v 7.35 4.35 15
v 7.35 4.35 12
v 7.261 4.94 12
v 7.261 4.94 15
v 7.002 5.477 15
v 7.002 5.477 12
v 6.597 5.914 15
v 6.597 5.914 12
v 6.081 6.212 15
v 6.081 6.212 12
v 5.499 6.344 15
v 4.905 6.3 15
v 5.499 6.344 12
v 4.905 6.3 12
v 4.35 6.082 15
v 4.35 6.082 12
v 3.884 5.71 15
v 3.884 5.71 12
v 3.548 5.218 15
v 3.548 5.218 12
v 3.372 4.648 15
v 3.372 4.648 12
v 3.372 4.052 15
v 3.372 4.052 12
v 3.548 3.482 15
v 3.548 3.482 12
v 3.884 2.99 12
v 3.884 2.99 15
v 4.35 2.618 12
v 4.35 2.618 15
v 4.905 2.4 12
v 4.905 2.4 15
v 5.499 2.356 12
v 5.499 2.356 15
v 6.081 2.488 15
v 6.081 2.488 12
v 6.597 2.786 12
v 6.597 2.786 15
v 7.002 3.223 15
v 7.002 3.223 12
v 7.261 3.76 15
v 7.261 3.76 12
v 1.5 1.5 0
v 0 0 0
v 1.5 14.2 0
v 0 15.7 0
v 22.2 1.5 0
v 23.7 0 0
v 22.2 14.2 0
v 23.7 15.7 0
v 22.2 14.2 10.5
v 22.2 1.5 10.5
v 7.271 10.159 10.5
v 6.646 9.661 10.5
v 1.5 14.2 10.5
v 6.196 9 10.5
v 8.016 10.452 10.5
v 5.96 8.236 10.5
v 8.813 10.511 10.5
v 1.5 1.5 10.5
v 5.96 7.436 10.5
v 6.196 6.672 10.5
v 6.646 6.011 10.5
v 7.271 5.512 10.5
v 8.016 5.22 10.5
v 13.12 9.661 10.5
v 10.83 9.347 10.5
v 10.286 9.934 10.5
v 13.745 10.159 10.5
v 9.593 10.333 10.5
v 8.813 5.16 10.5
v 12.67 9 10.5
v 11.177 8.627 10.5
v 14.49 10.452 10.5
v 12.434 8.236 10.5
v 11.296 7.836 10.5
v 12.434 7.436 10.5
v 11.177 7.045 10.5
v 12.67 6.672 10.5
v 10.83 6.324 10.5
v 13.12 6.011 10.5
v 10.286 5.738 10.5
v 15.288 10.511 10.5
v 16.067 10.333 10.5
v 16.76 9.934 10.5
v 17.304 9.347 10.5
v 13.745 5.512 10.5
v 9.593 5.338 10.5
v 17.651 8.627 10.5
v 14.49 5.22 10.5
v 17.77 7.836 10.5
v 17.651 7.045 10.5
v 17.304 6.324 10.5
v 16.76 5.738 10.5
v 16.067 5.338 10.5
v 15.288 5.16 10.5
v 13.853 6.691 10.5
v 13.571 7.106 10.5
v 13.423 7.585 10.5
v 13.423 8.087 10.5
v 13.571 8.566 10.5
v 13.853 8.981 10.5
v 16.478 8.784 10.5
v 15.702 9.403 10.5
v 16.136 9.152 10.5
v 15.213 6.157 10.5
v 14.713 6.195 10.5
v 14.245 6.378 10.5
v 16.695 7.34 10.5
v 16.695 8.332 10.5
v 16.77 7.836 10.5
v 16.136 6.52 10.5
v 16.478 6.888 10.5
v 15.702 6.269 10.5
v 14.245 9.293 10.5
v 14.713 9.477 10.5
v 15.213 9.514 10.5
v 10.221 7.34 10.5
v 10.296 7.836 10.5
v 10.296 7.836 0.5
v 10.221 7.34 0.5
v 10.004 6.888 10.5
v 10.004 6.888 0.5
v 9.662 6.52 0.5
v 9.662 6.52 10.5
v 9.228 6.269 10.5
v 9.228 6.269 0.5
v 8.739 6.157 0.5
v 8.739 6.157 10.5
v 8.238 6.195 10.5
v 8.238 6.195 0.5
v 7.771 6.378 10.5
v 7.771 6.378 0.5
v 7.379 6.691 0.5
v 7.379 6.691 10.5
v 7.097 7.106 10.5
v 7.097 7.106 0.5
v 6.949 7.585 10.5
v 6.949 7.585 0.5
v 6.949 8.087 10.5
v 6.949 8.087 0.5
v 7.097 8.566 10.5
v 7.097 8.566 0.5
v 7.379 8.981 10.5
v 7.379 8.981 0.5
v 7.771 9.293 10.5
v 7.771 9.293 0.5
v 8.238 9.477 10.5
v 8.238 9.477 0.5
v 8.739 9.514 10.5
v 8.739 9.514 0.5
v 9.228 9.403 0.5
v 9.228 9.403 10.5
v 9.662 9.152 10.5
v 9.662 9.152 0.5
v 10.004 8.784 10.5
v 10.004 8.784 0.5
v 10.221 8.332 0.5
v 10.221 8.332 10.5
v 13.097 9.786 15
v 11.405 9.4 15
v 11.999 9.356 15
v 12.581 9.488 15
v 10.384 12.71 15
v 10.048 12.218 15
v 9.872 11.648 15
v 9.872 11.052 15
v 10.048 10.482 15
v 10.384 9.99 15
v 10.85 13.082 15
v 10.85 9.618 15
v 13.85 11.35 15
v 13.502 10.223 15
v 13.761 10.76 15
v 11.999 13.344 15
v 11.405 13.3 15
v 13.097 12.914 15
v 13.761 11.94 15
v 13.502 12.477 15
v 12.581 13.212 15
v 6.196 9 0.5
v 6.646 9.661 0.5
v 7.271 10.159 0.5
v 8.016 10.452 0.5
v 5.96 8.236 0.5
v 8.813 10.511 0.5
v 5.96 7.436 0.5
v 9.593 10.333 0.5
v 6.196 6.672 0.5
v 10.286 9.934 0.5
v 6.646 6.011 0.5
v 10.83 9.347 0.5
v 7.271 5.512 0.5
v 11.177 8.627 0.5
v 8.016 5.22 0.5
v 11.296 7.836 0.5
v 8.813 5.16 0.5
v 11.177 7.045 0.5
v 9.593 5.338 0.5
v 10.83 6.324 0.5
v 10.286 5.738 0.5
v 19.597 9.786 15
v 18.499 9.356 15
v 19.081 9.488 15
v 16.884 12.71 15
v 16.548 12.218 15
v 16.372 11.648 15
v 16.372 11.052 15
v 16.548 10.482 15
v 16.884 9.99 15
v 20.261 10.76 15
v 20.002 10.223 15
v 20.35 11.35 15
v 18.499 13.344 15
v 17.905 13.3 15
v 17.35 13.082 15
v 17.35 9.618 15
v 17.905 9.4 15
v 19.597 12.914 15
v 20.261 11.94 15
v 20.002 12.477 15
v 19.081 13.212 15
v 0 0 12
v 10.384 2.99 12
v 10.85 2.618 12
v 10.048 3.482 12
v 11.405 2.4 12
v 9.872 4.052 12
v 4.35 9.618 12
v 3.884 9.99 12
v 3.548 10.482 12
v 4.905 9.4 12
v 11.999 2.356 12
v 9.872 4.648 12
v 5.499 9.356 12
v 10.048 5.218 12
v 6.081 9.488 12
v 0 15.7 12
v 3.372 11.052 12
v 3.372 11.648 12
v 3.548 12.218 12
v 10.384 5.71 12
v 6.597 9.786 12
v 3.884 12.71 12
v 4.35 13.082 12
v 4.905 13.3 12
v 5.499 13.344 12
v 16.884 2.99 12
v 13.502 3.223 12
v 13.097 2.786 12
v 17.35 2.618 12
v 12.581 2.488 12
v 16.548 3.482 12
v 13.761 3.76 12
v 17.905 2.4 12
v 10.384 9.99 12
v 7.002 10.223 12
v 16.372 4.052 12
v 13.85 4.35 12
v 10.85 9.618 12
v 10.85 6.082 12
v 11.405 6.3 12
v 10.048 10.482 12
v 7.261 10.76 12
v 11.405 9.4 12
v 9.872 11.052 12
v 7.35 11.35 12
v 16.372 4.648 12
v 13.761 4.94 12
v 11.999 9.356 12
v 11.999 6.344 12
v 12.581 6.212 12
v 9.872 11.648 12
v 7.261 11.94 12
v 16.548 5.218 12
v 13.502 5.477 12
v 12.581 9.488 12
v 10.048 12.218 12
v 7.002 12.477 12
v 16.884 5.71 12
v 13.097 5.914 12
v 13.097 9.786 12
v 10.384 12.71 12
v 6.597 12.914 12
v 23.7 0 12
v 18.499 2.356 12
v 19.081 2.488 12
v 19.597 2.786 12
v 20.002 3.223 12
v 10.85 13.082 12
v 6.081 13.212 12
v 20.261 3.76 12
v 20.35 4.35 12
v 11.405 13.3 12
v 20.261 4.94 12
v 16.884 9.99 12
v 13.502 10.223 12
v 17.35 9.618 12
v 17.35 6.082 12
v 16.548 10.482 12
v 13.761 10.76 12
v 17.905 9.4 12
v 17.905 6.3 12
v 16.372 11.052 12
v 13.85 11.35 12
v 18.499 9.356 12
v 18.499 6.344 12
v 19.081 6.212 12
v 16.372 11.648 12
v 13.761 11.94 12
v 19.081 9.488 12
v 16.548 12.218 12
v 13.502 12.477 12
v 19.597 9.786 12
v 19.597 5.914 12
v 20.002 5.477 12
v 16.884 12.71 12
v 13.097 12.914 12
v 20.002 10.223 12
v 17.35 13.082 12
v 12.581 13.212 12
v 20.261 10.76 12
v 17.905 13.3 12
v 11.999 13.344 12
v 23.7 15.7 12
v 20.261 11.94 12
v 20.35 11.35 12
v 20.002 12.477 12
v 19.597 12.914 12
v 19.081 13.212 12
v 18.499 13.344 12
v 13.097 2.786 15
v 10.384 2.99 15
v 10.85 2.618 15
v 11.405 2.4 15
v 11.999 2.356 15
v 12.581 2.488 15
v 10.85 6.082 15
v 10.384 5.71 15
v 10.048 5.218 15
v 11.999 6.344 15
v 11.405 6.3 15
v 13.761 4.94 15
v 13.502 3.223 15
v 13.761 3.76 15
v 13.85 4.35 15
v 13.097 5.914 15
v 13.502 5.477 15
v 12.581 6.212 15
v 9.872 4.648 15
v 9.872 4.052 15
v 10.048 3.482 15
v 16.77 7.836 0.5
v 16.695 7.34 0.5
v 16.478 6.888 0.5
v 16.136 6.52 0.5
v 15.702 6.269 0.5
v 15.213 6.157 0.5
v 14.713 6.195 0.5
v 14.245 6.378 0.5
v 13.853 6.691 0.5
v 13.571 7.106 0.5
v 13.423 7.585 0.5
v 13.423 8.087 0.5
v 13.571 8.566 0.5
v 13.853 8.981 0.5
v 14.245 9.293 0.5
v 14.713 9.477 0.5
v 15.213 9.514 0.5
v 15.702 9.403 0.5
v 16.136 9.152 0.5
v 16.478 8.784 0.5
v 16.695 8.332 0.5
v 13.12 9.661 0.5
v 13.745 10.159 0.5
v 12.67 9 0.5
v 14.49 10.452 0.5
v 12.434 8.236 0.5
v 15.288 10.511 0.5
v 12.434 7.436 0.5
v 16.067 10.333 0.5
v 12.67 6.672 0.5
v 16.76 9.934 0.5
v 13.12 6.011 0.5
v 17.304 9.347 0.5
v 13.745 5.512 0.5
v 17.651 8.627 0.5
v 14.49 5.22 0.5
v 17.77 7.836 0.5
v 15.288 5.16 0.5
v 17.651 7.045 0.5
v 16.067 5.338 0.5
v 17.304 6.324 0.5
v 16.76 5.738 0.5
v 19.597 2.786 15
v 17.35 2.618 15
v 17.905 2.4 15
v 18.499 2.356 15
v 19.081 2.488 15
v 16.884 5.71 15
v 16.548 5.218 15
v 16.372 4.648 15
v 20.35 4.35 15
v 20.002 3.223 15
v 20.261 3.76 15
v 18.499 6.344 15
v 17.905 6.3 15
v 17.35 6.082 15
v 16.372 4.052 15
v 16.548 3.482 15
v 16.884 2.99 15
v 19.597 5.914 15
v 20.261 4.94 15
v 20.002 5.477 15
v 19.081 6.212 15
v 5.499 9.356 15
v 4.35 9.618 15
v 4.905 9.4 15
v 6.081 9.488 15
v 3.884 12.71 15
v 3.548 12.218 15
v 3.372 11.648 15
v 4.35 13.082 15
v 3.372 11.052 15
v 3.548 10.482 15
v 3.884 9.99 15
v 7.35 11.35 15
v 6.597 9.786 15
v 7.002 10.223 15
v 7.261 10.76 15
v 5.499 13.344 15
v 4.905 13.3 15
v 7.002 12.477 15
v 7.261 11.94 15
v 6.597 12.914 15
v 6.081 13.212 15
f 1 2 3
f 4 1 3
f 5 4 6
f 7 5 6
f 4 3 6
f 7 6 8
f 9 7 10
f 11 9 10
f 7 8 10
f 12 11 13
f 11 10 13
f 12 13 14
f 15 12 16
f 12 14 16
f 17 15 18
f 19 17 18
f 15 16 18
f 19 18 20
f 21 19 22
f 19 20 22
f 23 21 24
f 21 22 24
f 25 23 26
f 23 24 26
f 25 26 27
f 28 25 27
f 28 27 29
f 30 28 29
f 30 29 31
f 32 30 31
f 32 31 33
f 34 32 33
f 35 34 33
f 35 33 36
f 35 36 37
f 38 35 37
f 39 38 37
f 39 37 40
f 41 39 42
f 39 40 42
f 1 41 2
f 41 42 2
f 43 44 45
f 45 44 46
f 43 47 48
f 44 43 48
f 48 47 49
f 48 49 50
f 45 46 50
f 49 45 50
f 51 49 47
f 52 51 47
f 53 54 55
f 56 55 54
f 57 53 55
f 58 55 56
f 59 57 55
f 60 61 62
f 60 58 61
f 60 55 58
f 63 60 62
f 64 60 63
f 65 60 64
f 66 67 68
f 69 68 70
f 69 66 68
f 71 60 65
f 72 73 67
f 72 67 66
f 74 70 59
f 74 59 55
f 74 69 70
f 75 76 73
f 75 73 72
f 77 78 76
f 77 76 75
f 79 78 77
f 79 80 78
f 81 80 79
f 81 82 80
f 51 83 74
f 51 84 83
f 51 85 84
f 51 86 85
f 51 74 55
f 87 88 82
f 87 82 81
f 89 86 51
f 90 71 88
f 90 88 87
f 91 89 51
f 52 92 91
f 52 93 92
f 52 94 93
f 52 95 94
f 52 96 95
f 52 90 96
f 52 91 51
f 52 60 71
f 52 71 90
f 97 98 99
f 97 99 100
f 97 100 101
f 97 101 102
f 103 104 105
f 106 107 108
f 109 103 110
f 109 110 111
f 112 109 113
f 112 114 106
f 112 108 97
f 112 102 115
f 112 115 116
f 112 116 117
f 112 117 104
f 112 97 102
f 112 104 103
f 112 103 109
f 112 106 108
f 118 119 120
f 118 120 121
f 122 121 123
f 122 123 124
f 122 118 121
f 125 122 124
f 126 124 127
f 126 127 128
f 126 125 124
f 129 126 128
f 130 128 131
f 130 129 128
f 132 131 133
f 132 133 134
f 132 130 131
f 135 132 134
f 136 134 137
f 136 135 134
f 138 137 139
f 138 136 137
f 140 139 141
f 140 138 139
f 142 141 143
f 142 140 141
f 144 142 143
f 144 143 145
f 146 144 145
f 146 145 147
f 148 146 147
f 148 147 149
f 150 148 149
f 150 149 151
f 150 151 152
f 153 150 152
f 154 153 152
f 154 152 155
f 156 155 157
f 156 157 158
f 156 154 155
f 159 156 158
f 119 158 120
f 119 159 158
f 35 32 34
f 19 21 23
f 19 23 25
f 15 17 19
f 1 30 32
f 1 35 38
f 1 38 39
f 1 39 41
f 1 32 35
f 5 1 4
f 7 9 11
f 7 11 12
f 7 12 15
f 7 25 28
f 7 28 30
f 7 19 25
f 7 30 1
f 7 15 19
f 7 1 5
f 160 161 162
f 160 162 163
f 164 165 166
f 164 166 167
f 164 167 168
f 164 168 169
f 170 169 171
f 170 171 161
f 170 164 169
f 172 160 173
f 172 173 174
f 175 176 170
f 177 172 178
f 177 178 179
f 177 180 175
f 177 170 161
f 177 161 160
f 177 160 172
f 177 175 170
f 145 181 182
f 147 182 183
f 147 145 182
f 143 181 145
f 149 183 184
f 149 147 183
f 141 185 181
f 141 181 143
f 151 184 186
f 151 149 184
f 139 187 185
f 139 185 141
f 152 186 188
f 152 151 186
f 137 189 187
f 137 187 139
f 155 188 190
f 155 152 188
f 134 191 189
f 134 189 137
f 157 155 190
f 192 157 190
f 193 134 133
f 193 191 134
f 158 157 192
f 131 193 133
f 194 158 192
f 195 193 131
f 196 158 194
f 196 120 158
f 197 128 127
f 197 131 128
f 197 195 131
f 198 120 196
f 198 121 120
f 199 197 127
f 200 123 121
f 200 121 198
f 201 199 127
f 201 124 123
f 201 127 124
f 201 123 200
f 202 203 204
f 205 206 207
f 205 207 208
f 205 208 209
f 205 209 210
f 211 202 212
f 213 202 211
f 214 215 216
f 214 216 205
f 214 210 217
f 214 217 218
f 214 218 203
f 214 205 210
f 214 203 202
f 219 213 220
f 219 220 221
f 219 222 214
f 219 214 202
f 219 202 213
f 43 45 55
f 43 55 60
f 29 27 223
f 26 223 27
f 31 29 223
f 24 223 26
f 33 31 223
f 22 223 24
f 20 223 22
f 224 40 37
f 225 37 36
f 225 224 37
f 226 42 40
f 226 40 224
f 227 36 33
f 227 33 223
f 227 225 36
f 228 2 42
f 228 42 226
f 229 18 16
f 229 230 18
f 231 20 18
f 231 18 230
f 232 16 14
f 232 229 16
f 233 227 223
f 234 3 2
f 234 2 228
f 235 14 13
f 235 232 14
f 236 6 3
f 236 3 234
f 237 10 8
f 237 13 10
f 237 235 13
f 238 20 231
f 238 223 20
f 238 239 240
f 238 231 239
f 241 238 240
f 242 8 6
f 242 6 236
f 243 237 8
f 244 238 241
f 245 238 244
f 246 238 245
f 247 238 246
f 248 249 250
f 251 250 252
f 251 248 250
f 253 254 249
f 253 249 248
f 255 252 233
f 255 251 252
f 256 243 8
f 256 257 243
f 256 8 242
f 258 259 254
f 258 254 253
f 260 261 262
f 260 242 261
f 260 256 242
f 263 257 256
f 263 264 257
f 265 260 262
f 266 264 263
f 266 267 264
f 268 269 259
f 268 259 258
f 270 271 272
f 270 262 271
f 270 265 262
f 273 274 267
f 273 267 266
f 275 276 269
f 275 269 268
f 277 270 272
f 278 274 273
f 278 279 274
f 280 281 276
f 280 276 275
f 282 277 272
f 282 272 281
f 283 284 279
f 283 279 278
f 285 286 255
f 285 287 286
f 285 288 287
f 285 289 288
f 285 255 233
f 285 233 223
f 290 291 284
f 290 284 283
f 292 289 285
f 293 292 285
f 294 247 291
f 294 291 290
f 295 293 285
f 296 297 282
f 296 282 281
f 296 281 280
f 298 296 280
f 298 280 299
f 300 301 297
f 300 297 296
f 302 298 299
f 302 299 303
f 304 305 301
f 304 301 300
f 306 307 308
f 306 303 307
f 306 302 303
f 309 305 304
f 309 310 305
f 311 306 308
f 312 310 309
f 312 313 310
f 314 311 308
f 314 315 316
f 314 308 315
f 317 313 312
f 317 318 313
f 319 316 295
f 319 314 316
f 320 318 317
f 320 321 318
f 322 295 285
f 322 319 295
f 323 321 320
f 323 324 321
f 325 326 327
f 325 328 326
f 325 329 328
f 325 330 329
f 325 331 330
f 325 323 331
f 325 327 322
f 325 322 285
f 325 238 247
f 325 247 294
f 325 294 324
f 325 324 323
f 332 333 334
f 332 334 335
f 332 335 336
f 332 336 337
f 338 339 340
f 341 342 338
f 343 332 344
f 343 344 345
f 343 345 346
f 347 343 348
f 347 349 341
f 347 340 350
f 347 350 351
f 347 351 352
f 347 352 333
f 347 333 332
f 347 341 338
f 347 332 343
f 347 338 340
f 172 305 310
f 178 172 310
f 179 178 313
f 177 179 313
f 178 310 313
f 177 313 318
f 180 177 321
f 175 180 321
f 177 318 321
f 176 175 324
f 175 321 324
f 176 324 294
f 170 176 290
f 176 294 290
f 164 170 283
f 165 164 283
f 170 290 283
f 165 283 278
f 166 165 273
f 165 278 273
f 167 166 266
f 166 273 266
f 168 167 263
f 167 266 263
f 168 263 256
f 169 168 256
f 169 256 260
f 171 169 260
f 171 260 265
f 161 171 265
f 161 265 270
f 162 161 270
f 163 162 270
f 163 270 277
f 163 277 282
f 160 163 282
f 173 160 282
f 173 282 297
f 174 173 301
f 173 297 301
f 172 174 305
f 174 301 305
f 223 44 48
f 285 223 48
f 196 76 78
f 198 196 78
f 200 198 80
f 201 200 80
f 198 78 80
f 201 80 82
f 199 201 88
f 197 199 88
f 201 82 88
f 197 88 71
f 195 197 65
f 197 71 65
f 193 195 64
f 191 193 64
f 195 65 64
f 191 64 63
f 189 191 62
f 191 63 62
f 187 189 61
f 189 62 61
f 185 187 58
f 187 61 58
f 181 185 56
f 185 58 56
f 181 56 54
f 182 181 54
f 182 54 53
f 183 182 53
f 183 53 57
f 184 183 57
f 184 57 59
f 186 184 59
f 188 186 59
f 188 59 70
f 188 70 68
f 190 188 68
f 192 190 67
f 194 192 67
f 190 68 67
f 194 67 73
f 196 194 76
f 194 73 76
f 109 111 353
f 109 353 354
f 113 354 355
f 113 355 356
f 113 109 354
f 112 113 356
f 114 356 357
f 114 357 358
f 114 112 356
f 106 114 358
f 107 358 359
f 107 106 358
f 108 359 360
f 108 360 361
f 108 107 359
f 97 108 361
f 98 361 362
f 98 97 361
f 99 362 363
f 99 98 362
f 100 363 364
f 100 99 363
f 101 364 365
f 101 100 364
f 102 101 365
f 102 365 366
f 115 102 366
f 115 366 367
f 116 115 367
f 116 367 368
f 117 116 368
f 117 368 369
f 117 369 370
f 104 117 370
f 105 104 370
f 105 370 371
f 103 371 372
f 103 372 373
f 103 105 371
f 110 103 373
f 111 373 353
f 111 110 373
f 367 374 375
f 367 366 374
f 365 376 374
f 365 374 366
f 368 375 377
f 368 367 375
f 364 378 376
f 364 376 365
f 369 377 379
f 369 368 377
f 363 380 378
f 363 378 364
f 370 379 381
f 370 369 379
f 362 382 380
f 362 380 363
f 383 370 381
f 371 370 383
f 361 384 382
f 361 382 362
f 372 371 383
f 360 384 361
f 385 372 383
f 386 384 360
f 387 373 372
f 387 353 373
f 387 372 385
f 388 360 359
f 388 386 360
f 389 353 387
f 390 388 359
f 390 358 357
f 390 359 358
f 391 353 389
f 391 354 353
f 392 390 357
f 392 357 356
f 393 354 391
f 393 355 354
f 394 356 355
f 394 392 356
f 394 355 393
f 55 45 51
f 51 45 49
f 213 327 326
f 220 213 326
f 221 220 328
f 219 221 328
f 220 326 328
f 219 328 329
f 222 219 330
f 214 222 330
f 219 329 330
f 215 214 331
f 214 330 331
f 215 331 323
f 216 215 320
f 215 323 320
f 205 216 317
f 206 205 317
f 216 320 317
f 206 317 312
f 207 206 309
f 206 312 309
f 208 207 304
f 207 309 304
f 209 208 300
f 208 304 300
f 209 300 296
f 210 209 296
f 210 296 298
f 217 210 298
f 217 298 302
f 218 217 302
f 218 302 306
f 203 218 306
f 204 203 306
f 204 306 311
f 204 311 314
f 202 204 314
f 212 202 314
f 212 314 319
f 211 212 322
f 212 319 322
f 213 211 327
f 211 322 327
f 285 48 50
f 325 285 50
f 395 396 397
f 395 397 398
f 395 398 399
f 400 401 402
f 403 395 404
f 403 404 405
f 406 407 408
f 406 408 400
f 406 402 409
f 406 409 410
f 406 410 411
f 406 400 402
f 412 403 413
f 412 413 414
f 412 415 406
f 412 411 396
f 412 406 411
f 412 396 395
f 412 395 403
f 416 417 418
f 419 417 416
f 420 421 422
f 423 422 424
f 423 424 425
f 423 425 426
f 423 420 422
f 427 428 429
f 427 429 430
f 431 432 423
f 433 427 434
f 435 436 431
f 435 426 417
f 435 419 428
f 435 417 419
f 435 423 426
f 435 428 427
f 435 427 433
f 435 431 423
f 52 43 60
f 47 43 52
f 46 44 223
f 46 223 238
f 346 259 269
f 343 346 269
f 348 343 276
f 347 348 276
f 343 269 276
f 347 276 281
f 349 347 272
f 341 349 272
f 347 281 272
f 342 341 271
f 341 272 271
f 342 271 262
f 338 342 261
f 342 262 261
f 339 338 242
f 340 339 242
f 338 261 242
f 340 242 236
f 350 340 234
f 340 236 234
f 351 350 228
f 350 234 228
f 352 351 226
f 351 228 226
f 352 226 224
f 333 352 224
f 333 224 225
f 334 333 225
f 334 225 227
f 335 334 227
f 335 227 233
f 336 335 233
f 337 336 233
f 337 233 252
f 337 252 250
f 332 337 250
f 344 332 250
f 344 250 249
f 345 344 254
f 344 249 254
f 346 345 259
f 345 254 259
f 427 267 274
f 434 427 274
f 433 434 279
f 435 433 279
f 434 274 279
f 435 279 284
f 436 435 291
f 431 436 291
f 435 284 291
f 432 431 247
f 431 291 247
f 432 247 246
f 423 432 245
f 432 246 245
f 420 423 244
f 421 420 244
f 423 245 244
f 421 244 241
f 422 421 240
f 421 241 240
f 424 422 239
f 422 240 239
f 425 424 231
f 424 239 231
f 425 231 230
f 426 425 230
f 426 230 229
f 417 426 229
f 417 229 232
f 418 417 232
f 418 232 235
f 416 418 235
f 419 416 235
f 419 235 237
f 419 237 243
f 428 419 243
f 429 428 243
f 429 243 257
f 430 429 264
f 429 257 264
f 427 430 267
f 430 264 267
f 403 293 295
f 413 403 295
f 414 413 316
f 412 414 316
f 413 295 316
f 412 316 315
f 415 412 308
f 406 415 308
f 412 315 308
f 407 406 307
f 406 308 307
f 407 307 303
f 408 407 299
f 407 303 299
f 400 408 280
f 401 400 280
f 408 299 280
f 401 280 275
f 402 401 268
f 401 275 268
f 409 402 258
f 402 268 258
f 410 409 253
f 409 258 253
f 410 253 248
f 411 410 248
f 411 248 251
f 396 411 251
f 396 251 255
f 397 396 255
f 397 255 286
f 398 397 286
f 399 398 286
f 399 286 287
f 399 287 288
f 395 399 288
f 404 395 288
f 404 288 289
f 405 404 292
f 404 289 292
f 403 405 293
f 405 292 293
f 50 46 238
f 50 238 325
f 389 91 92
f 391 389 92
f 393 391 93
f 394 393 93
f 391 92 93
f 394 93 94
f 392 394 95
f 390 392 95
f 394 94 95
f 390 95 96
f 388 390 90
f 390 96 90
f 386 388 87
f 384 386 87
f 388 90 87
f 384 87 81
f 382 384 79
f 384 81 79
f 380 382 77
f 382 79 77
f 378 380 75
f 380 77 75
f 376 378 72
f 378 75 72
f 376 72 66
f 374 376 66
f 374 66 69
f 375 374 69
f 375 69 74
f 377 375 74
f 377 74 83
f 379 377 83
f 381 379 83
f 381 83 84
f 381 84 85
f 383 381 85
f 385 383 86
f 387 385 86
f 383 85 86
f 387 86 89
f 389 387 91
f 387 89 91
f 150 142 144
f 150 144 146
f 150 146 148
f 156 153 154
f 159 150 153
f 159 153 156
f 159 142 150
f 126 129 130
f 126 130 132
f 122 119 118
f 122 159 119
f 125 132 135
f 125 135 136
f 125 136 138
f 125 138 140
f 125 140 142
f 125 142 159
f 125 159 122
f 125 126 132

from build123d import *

# Parameters (mm, degrees)
F0_W     = 23.7
F0_H     = 15.7
F1_DEPTH = 12
F2_R     = 2
F3_DEPTH = 3
F4_W     = 20.7
F4_H     = 12.7
F5_DEPTH = 10.5
F6_R     = 2.683106
F6_R_2   = 1.683106
F7_DEPTH = 10


with BuildPart() as f1:
    # F0 (on Top) → F1 (new body)
    with BuildSketch(Plane.XY):
        with Locations((11.85, 7.85)):
            Rectangle(F0_W, F0_H)
    extrude(amount=F1_DEPTH)

    # F2 (on face) → F3 (join)
    with BuildSketch(Plane.XY.offset(12)):
        with Locations((5.35, 11.35)):
            Circle(F2_R)
        with Locations((11.85, 11.35)):
            Circle(F2_R)
        with Locations((18.35, 11.35)):
            Circle(F2_R)
        with Locations((5.35, 4.35)):
            Circle(F2_R)
        with Locations((11.85, 4.35)):
            Circle(F2_R)
        with Locations((18.35, 4.35)):
            Circle(F2_R)
    extrude(amount=F3_DEPTH)

    # F4 (on face) → F5 (cut)
    with BuildSketch(Plane(origin=(0, 0, 0), x_dir=(1, 0, 0), z_dir=(0, 0, -1))):
        with Locations((11.85, -7.85)):
            Rectangle(F4_W, F4_H)
    extrude(amount=-F5_DEPTH, mode=Mode.SUBTRACT)

    # F6 (on face) → F7 (join)
    with BuildSketch(Plane(origin=(0, 0, 10.5), x_dir=(1, 0, 0), z_dir=(0, 0, -1))):
        with Locations((8.612973, -7.835798)):
            Circle(F6_R)
        with Locations((8.612973, -7.835798)):
            Circle(F6_R_2, mode=Mode.SUBTRACT)
        with Locations((15.087027, -7.835798)):
            Circle(F6_R)
        with Locations((15.087027, -7.835798)):
            Circle(F6_R_2, mode=Mode.SUBTRACT)
    extrude(amount=F7_DEPTH)


solid = f1.part
